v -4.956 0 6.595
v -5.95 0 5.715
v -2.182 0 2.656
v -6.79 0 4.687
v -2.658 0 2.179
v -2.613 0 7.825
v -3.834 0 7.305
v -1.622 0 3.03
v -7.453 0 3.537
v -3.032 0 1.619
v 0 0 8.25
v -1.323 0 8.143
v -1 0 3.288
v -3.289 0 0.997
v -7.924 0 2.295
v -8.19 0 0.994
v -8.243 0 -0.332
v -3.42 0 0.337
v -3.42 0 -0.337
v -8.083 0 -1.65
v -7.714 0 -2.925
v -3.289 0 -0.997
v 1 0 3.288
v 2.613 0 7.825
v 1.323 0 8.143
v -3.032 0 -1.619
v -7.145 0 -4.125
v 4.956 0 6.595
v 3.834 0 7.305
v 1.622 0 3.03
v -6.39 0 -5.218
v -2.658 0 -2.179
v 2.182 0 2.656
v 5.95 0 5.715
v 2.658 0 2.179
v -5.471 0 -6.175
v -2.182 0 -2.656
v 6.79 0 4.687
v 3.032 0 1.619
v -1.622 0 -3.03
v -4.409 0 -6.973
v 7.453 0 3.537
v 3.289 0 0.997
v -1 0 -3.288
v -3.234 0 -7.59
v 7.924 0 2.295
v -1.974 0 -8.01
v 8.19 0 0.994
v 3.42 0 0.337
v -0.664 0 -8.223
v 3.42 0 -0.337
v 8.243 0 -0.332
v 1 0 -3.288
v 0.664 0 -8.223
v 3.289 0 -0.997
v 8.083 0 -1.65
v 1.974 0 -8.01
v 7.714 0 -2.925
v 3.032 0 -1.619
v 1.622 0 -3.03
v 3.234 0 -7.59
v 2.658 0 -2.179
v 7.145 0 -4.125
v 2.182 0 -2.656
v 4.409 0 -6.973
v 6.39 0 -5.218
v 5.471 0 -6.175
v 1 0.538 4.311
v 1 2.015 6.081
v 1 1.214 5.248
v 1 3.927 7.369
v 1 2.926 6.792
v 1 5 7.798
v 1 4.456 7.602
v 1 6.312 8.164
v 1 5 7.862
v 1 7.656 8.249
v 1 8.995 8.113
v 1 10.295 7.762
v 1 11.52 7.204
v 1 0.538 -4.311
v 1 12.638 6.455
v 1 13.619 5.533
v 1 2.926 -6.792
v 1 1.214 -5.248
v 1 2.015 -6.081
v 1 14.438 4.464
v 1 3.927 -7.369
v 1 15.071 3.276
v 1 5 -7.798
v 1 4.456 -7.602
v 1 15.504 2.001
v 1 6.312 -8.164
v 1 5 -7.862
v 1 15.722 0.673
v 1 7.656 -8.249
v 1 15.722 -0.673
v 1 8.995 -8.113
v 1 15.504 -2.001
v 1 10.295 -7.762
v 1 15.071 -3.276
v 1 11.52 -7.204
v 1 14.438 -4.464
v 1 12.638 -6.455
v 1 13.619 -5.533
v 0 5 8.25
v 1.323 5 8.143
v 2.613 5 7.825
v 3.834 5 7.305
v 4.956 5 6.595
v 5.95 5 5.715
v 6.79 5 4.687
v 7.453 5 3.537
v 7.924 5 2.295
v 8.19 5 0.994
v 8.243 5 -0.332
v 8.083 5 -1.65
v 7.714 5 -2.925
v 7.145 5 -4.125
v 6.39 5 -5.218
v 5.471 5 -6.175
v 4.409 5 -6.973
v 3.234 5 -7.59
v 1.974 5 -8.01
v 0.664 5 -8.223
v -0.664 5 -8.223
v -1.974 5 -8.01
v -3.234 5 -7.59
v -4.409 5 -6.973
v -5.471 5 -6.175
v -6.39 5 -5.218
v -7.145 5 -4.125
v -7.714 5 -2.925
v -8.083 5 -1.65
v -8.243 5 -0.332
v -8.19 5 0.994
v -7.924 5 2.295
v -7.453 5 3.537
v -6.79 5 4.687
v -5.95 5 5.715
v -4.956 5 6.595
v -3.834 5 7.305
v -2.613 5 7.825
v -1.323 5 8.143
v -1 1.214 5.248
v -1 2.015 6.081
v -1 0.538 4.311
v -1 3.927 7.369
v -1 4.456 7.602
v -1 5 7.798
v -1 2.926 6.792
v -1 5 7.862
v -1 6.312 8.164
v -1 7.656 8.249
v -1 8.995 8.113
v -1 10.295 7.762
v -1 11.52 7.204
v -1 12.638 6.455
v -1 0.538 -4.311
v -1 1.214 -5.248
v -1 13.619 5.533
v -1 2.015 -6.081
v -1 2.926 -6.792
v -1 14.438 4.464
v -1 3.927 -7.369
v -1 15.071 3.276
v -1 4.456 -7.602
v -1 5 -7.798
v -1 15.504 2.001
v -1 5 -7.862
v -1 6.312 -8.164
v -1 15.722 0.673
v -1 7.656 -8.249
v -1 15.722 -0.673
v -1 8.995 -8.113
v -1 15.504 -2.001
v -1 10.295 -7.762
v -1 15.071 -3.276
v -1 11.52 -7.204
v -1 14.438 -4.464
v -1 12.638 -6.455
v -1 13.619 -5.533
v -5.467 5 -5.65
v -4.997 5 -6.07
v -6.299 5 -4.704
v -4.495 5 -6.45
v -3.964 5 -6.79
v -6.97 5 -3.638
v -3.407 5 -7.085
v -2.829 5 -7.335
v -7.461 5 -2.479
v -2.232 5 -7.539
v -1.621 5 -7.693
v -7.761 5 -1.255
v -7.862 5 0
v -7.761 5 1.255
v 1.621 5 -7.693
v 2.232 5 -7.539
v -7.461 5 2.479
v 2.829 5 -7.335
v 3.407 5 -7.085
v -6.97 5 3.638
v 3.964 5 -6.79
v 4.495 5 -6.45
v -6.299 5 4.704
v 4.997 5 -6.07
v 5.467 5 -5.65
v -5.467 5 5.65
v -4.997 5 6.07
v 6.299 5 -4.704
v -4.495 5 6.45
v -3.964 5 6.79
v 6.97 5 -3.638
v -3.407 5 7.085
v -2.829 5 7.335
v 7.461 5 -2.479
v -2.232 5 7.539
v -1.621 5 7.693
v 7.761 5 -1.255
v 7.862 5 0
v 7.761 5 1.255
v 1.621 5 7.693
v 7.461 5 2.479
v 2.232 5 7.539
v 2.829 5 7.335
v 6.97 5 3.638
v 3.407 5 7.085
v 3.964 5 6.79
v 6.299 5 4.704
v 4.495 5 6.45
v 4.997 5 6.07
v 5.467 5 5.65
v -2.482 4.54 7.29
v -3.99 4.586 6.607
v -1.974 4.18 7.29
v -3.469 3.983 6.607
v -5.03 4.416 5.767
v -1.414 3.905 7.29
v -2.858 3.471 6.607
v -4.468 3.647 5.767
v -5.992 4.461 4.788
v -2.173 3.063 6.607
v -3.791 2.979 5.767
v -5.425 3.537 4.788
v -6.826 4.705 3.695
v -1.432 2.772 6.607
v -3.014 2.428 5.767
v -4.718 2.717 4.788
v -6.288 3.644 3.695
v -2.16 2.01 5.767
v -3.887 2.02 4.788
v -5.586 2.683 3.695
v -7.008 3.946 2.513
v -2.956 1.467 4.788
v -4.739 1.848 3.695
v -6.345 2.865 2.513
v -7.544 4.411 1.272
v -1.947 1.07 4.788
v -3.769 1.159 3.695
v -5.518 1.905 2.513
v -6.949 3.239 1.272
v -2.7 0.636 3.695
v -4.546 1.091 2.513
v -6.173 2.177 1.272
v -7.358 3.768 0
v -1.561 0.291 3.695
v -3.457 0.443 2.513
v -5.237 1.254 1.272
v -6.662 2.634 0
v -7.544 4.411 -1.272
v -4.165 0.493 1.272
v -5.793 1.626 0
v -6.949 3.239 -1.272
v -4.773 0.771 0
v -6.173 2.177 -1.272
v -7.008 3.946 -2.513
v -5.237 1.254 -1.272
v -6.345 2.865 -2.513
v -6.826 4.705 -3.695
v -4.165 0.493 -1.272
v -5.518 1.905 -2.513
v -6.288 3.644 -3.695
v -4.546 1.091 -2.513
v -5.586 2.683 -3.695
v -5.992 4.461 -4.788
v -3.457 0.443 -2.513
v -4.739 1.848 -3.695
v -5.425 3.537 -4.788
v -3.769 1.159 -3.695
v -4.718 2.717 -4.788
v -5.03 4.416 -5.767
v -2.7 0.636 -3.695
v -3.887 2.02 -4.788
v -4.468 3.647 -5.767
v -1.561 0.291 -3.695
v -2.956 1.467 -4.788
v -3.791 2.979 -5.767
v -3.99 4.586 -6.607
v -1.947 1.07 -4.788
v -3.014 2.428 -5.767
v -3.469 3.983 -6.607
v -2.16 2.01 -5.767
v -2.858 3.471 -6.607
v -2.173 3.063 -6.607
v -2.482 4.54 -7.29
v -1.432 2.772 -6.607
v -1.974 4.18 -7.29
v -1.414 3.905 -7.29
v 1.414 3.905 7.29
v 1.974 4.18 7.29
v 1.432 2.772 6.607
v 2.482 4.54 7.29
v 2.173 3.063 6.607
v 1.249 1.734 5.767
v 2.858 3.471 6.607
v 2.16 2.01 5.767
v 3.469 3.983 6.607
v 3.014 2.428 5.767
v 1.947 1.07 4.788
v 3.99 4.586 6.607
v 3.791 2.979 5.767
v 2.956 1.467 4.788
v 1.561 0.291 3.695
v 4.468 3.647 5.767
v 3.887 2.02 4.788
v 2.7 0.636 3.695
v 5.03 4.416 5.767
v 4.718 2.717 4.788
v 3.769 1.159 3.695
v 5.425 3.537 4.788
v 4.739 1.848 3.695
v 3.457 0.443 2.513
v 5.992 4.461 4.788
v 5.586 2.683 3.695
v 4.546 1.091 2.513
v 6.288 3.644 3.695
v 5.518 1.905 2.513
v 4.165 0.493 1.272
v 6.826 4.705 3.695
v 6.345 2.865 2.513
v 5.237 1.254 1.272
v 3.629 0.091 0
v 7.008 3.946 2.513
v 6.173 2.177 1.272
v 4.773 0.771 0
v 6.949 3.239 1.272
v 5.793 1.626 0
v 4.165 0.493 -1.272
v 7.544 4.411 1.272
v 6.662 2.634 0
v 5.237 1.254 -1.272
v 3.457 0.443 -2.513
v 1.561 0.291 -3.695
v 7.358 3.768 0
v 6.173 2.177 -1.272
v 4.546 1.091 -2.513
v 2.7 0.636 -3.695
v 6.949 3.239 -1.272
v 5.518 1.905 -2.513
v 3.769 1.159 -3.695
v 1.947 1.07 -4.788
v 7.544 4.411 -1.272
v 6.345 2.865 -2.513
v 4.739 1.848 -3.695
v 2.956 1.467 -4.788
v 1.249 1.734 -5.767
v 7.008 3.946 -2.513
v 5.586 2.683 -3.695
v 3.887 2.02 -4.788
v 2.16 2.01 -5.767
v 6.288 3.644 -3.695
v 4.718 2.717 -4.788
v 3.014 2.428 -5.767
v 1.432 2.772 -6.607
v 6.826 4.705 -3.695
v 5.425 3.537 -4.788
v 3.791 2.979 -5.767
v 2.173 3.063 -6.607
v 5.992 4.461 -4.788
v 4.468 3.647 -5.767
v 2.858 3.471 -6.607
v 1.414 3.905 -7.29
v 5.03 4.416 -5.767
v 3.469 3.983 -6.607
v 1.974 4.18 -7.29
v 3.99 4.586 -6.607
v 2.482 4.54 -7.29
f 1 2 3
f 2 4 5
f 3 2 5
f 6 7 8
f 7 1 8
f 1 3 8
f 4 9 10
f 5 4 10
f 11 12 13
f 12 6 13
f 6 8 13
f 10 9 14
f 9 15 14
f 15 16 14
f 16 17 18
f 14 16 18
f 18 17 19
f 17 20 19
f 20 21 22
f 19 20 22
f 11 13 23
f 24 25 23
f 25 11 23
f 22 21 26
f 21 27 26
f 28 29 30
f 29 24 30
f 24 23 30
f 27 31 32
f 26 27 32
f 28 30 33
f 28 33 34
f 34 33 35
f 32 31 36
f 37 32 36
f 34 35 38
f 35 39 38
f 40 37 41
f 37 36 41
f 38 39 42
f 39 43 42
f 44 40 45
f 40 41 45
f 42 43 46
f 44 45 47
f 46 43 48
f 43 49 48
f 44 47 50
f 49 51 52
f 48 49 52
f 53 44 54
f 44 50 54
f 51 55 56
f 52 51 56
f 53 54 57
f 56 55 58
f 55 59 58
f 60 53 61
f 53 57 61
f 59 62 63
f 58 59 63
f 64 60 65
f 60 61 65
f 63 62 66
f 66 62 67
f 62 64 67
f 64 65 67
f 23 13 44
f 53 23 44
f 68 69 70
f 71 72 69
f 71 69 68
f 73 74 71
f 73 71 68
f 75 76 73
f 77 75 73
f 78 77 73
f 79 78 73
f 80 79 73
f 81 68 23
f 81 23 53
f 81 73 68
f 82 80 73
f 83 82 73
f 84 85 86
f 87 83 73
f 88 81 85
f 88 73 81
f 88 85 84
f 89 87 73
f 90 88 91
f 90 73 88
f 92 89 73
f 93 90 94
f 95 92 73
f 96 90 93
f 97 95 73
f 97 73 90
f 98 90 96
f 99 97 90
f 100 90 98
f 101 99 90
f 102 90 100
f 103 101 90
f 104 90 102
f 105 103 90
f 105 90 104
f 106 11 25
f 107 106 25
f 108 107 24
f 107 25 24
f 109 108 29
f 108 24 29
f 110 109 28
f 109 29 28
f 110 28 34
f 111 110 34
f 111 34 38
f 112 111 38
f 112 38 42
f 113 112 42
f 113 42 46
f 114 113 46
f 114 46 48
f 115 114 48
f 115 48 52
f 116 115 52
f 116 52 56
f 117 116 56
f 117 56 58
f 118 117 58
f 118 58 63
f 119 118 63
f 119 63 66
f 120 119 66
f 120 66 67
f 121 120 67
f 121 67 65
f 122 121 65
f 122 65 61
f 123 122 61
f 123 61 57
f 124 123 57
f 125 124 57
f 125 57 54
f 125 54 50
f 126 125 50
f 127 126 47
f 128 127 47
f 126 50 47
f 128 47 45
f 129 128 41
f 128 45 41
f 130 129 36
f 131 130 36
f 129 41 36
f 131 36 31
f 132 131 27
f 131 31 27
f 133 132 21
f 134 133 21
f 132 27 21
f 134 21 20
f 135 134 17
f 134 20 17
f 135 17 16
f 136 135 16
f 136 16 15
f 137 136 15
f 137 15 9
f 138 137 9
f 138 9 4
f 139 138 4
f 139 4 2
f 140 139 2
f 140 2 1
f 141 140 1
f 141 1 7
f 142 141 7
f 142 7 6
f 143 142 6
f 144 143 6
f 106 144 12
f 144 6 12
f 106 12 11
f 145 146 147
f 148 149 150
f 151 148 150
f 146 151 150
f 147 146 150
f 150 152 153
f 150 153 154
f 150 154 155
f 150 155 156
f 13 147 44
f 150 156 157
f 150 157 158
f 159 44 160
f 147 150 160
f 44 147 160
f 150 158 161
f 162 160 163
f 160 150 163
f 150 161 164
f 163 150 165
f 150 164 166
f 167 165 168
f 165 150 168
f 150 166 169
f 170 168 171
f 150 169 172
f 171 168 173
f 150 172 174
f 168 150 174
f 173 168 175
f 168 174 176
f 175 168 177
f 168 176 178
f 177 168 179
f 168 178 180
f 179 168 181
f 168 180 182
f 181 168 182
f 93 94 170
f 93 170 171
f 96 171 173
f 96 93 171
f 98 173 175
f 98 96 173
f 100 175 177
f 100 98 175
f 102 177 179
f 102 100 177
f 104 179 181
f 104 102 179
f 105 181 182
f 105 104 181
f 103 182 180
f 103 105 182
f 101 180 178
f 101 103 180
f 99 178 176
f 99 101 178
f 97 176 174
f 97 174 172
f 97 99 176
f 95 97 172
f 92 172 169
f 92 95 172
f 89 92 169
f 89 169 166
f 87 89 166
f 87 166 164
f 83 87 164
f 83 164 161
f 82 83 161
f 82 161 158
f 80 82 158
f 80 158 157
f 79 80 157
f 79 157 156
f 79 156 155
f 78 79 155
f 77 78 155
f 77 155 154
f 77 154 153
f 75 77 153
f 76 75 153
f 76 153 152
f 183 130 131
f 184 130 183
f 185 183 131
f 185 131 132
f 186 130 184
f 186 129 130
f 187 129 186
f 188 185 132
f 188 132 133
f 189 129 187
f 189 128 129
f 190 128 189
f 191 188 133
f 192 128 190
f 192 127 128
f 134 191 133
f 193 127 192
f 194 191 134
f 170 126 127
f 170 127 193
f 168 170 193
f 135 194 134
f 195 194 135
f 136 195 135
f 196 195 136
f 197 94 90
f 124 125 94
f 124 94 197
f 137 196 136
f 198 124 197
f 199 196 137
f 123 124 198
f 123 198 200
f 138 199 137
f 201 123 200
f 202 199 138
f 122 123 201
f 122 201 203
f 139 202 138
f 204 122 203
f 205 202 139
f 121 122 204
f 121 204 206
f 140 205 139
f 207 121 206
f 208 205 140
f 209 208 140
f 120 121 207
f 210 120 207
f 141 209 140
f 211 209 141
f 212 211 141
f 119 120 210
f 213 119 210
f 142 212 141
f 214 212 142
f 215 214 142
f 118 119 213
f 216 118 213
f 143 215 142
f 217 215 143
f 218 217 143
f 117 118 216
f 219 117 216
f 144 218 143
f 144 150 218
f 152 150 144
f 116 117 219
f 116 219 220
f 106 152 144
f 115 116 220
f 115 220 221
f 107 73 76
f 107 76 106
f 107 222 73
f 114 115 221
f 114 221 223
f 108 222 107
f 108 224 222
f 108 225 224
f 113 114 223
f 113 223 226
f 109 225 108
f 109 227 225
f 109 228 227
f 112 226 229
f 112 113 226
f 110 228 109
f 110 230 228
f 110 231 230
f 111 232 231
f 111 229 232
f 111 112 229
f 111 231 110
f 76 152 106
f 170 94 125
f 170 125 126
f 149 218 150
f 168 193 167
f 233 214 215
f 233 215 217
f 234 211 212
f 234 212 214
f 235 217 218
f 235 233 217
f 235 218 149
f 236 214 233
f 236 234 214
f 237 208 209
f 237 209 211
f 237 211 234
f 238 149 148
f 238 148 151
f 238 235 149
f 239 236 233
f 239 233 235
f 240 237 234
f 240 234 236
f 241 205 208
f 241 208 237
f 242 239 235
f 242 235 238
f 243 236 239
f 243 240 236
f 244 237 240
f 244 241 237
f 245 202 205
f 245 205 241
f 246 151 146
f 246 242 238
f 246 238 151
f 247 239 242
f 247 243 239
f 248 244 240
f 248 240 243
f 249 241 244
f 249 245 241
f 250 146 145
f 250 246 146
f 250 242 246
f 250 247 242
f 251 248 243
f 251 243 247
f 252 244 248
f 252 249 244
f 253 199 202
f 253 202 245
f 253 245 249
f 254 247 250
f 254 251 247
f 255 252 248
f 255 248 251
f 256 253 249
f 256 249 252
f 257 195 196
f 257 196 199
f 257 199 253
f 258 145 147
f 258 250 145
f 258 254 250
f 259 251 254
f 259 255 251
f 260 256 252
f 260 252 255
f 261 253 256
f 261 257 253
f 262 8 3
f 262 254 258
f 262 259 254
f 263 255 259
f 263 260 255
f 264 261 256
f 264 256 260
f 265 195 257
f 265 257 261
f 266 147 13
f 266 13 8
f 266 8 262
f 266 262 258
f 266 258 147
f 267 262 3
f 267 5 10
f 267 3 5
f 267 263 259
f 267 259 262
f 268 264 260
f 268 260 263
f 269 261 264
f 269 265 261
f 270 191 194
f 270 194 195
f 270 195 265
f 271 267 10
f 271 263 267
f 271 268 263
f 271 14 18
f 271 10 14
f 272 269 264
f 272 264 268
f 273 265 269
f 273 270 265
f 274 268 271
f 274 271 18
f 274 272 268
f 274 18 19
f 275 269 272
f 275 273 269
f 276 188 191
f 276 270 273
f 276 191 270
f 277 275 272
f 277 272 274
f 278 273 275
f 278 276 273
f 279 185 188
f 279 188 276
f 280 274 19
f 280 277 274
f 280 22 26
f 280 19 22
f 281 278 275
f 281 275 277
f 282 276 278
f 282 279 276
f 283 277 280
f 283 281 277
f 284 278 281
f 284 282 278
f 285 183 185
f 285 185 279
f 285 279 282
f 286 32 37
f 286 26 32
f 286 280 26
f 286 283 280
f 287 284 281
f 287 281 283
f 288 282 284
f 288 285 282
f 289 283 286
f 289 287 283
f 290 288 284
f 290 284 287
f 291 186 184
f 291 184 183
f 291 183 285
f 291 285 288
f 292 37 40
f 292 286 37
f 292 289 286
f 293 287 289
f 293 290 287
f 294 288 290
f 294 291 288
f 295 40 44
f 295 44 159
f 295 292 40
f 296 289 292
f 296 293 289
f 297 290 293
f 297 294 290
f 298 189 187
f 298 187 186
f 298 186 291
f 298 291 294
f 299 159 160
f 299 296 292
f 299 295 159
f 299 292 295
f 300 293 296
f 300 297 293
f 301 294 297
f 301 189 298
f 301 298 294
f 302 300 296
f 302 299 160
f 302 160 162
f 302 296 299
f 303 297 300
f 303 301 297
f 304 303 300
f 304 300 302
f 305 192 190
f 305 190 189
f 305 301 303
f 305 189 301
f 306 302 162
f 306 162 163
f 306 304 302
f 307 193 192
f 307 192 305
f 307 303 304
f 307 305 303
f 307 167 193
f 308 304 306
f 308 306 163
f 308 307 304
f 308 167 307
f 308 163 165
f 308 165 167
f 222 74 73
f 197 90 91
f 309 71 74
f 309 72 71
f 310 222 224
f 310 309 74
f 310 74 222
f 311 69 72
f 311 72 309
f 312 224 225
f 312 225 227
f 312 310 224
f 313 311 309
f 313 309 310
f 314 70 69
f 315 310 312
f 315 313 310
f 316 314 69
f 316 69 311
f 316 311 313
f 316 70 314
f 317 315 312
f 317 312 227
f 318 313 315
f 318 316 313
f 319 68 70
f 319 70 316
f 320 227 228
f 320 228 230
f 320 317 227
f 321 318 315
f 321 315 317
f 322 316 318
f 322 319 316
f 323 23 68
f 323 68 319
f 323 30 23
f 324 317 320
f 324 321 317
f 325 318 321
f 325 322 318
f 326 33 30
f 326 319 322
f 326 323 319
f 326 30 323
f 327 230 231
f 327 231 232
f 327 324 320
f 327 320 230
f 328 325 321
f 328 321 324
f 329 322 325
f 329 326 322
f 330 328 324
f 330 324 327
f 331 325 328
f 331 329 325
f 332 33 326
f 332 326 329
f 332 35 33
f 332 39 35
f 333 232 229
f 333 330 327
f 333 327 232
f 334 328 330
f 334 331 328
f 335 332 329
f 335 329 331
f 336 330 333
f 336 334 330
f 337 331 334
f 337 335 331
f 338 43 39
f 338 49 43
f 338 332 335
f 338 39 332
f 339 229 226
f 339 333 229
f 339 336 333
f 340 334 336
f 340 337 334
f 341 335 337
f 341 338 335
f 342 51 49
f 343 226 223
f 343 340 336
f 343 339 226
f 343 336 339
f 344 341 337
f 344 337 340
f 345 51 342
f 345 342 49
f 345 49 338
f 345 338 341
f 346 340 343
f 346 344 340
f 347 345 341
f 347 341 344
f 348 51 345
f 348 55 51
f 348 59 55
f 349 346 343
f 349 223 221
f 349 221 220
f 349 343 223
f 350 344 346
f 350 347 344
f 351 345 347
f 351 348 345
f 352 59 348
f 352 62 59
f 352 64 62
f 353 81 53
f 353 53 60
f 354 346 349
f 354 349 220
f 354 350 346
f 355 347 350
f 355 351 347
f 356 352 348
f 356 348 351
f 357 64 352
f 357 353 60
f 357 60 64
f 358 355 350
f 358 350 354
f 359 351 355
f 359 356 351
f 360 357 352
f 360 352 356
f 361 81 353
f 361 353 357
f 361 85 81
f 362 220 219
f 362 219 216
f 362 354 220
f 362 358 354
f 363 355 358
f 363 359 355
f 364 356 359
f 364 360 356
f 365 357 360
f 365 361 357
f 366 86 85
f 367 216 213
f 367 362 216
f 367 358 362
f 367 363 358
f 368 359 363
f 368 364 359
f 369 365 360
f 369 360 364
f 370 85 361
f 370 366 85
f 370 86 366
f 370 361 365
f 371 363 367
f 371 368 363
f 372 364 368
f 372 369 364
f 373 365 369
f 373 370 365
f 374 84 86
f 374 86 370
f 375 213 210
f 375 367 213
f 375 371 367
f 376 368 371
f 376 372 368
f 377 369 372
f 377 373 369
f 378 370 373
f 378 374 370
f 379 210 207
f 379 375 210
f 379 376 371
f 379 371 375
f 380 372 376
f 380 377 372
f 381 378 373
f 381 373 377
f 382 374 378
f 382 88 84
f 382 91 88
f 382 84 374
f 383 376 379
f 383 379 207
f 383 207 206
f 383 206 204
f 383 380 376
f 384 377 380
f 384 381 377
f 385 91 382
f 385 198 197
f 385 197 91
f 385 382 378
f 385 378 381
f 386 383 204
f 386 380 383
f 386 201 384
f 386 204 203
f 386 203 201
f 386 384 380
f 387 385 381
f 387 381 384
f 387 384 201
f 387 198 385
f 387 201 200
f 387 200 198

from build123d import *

# Parameters (mm, degrees)
CROQUIS1_R              = 8.25
SALIENTE_EXTRUIR1_DEPTH = 5
CROQUIS11_R             = 8.25
SALIENTE_EXTRUIR2_DEPTH = 1
CROQUIS13_W             = 16.491898527
CROQUIS13_H             = 1.592253137
CORTAR_EXTRUIR11_DEPTH  = 25.32457605


with BuildPart() as part:
    # Croquis1 → Saliente-Extruir1 (new body)
    with BuildSketch(Plane(origin=(0, 0, 0), x_dir=(1, 0, 0), z_dir=(0, 1, 0))):
        with Locations(Location((0, 0, 0), (0, 0, 270))):
            Circle(CROQUIS1_R)
    extrude(amount=SALIENTE_EXTRUIR1_DEPTH)

    # Croquis10 → Cortar-Revolución1 (revolve, cut)
    with BuildSketch(Plane(origin=(0, 7.5, 0), x_dir=(1, 0, 0), z_dir=(0, 1, 0))):
        with BuildLine():
            Line((0, 8.25), (0, -8.25))
            ThreePointArc((0, -8.25), (8.25, 0), (0, 8.25))
        make_face()
    revolve(axis=Axis((0, 7.5, -8.25), (0, 0, 1)), mode=Mode.SUBTRACT)

    # Croquis11 → Saliente-Extruir2 (add, symmetric)
    with BuildSketch(Plane(origin=(0, 0, 0), x_dir=(0, 0, -1), z_dir=(1, 0, 0))):
        with Locations((0, 7.5)):
            Circle(CROQUIS11_R)
    extrude(amount=SALIENTE_EXTRUIR2_DEPTH, both=True)

    # Croquis13 → Cortar-Extruir11 (cut, through all)
    with BuildSketch(Plane.XY.offset(-8.35)):
        with Locations((-0.004050736, -0.796126569)):
            Rectangle(CROQUIS13_W, CROQUIS13_H)
    extrude(amount=CORTAR_EXTRUIR11_DEPTH, mode=Mode.SUBTRACT)


solid = part.part
